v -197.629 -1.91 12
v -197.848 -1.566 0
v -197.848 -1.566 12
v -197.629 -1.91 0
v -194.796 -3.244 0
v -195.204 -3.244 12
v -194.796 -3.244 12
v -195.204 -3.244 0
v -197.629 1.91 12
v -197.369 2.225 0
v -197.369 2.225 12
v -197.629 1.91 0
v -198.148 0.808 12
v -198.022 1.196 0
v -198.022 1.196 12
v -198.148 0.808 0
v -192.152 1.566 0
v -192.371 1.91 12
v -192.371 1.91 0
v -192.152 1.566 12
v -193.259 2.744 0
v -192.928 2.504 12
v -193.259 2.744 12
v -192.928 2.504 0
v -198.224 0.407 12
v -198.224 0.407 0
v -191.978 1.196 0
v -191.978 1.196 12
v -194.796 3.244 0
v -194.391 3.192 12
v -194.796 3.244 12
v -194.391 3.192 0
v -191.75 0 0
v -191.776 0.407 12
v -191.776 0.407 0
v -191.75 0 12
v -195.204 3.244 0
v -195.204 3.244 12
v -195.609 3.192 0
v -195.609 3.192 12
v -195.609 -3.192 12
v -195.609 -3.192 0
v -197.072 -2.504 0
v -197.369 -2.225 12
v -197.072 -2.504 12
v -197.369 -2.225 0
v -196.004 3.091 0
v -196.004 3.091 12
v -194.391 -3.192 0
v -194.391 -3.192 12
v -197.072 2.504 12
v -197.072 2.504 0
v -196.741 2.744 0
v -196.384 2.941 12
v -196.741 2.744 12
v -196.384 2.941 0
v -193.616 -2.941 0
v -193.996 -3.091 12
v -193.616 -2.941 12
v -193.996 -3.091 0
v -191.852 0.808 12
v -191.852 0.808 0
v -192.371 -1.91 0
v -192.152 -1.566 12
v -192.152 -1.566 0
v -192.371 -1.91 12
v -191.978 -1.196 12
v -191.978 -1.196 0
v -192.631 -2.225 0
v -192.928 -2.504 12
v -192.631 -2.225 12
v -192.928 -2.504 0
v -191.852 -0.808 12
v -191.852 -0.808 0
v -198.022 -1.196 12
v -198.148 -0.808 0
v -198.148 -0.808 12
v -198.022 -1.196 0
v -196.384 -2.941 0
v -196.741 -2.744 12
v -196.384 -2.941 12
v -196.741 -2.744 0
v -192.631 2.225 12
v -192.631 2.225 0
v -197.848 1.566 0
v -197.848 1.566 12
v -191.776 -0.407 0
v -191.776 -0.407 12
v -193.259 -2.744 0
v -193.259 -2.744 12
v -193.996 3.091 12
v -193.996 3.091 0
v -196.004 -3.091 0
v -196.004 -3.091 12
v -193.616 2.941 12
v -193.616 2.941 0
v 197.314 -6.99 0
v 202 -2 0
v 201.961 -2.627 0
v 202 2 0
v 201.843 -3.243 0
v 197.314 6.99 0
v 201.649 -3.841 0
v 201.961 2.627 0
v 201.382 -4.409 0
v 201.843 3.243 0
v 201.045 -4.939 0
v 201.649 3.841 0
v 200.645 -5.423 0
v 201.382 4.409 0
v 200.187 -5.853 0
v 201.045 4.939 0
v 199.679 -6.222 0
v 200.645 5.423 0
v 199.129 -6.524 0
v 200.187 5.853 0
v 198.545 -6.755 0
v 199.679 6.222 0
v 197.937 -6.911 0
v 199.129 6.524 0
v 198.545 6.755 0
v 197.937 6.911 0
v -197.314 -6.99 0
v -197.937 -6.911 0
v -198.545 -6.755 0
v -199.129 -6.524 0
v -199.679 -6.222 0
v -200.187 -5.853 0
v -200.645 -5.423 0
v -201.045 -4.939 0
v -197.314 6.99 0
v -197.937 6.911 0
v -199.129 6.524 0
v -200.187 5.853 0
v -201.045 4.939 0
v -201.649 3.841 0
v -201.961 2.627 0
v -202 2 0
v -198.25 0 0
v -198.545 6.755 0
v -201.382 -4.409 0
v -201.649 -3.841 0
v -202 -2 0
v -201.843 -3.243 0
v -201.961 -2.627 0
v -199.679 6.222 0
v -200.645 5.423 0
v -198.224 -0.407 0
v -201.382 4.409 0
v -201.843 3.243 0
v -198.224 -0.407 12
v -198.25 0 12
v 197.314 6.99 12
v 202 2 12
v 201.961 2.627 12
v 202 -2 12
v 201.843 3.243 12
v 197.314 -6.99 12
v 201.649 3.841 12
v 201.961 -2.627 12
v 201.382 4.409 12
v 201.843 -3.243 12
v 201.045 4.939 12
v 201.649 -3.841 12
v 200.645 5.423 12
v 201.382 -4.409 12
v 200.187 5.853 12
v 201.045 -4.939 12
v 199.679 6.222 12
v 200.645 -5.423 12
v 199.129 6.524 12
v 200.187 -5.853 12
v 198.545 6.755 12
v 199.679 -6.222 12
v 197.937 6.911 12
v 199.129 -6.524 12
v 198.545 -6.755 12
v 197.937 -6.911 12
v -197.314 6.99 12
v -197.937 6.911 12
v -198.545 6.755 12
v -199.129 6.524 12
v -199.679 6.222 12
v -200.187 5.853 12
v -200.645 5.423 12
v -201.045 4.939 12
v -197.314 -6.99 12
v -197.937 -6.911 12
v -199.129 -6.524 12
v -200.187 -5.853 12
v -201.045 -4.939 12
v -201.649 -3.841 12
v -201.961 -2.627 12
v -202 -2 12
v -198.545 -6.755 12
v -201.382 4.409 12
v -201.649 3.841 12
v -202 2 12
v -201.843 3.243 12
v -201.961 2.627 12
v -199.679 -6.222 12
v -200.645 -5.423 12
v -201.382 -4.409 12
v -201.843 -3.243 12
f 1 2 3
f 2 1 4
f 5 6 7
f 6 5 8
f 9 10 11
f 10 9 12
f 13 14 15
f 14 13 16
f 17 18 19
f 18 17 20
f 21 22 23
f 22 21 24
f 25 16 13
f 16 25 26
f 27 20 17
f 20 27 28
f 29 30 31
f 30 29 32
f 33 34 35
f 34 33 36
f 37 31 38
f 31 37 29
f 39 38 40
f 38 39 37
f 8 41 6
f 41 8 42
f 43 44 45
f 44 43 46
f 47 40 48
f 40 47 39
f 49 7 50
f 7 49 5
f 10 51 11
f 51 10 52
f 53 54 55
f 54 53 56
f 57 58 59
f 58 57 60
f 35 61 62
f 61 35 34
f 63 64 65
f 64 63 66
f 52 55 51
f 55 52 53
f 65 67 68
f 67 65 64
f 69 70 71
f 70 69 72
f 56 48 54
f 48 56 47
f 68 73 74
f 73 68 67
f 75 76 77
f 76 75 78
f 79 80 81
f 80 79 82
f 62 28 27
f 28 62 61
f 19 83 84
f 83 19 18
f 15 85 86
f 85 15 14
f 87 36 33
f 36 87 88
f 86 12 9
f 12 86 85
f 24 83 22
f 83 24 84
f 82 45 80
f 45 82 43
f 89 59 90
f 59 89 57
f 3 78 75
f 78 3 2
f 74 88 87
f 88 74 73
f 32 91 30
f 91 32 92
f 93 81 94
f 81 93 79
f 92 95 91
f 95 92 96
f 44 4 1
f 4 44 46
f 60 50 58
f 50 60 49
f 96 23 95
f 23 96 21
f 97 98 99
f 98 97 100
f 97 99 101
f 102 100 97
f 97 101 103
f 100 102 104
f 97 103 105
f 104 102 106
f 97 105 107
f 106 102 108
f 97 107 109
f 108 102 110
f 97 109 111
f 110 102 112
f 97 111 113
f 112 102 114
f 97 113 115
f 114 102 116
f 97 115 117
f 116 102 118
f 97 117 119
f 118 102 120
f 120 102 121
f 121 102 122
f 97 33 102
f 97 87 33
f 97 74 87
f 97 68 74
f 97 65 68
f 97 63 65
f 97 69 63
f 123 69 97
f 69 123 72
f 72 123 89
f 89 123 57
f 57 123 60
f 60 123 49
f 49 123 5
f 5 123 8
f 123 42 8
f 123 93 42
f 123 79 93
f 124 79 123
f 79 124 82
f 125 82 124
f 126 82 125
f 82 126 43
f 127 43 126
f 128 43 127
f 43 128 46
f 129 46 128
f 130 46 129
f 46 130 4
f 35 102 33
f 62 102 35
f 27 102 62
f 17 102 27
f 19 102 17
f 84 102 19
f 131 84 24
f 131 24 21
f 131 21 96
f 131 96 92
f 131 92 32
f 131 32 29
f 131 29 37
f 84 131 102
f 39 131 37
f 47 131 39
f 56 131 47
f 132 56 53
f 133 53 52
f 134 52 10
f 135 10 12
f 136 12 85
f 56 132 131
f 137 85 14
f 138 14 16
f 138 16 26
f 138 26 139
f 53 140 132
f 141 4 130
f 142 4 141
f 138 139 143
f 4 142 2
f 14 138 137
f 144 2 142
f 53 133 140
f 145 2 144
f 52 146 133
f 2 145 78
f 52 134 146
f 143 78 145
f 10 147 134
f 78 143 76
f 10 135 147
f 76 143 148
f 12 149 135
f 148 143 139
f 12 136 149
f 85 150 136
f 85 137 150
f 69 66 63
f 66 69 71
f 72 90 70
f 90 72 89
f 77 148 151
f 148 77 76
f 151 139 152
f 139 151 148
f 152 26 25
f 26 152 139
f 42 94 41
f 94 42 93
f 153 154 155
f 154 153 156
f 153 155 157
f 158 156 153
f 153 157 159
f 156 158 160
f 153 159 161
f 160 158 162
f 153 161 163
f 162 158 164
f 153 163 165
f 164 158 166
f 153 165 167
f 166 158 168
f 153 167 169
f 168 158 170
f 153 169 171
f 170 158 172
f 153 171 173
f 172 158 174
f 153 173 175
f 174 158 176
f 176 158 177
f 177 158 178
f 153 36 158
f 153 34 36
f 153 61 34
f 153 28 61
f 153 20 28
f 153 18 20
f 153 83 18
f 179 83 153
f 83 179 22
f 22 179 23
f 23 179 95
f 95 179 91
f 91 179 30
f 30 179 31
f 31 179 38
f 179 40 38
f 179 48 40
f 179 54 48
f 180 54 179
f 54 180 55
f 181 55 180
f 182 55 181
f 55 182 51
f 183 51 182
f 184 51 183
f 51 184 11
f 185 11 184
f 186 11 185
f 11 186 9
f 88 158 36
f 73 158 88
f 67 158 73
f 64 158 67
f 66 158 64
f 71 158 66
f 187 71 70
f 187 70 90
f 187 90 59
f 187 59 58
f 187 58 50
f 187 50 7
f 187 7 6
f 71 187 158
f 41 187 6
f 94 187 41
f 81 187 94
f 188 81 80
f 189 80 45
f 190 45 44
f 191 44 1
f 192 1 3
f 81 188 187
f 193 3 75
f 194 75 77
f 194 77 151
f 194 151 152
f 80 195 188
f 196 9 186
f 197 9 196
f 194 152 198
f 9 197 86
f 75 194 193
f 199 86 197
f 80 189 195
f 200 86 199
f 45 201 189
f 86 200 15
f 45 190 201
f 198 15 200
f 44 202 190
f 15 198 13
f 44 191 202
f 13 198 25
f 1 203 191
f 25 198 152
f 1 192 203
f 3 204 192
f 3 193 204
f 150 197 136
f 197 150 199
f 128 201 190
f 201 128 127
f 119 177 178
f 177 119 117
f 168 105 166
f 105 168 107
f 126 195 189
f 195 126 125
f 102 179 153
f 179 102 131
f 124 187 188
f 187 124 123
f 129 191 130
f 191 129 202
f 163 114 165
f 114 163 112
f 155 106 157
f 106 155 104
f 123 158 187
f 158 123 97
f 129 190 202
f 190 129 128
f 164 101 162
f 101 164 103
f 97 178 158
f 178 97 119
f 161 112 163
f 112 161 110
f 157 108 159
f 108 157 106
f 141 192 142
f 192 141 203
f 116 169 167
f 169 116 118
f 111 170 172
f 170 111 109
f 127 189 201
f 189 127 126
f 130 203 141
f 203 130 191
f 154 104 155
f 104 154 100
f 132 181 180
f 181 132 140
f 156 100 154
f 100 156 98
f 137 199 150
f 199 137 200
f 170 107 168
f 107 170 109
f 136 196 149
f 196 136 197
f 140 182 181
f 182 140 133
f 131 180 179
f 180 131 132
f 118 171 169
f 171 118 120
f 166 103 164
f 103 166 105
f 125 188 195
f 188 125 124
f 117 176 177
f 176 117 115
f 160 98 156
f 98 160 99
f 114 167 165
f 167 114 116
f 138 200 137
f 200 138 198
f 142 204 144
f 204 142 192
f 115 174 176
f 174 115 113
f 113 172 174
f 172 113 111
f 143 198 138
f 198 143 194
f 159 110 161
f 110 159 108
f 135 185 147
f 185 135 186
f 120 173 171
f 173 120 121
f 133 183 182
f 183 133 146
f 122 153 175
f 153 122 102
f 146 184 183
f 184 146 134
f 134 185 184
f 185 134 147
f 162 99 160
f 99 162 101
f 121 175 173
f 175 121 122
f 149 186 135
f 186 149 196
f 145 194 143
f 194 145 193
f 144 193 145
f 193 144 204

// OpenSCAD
$fn = 50;


difference() {
	union() {
		hull() {
			translate(v = [-197.0000000000, 2.0000000000, 0]) {
				cylinder(h = 12, r = 5);
			}
			translate(v = [197.0000000000, 2.0000000000, 0]) {
				cylinder(h = 12, r = 5);
			}
			translate(v = [-197.0000000000, -2.0000000000, 0]) {
				cylinder(h = 12, r = 5);
			}
			translate(v = [197.0000000000, -2.0000000000, 0]) {
				cylinder(h = 12, r = 5);
			}
		}
	}
	union() {
		translate(v = [-195.0000000000, 0.0000000000, 0]) {
			cylinder(h = 12, r = 3.2500000000);
		}
		translate(v = [-195.0000000000, 0.0000000000, 0]) {
			cylinder(h = 12, r = 1.8000000000);
		}
		translate(v = [-195.0000000000, 0.0000000000, 0]) {
			cylinder(h = 12, r = 1.8000000000);
		}
		translate(v = [-195.0000000000, 0.0000000000, 0]) {
			cylinder(h = 12, r = 1.8000000000);
		}
	}
}
